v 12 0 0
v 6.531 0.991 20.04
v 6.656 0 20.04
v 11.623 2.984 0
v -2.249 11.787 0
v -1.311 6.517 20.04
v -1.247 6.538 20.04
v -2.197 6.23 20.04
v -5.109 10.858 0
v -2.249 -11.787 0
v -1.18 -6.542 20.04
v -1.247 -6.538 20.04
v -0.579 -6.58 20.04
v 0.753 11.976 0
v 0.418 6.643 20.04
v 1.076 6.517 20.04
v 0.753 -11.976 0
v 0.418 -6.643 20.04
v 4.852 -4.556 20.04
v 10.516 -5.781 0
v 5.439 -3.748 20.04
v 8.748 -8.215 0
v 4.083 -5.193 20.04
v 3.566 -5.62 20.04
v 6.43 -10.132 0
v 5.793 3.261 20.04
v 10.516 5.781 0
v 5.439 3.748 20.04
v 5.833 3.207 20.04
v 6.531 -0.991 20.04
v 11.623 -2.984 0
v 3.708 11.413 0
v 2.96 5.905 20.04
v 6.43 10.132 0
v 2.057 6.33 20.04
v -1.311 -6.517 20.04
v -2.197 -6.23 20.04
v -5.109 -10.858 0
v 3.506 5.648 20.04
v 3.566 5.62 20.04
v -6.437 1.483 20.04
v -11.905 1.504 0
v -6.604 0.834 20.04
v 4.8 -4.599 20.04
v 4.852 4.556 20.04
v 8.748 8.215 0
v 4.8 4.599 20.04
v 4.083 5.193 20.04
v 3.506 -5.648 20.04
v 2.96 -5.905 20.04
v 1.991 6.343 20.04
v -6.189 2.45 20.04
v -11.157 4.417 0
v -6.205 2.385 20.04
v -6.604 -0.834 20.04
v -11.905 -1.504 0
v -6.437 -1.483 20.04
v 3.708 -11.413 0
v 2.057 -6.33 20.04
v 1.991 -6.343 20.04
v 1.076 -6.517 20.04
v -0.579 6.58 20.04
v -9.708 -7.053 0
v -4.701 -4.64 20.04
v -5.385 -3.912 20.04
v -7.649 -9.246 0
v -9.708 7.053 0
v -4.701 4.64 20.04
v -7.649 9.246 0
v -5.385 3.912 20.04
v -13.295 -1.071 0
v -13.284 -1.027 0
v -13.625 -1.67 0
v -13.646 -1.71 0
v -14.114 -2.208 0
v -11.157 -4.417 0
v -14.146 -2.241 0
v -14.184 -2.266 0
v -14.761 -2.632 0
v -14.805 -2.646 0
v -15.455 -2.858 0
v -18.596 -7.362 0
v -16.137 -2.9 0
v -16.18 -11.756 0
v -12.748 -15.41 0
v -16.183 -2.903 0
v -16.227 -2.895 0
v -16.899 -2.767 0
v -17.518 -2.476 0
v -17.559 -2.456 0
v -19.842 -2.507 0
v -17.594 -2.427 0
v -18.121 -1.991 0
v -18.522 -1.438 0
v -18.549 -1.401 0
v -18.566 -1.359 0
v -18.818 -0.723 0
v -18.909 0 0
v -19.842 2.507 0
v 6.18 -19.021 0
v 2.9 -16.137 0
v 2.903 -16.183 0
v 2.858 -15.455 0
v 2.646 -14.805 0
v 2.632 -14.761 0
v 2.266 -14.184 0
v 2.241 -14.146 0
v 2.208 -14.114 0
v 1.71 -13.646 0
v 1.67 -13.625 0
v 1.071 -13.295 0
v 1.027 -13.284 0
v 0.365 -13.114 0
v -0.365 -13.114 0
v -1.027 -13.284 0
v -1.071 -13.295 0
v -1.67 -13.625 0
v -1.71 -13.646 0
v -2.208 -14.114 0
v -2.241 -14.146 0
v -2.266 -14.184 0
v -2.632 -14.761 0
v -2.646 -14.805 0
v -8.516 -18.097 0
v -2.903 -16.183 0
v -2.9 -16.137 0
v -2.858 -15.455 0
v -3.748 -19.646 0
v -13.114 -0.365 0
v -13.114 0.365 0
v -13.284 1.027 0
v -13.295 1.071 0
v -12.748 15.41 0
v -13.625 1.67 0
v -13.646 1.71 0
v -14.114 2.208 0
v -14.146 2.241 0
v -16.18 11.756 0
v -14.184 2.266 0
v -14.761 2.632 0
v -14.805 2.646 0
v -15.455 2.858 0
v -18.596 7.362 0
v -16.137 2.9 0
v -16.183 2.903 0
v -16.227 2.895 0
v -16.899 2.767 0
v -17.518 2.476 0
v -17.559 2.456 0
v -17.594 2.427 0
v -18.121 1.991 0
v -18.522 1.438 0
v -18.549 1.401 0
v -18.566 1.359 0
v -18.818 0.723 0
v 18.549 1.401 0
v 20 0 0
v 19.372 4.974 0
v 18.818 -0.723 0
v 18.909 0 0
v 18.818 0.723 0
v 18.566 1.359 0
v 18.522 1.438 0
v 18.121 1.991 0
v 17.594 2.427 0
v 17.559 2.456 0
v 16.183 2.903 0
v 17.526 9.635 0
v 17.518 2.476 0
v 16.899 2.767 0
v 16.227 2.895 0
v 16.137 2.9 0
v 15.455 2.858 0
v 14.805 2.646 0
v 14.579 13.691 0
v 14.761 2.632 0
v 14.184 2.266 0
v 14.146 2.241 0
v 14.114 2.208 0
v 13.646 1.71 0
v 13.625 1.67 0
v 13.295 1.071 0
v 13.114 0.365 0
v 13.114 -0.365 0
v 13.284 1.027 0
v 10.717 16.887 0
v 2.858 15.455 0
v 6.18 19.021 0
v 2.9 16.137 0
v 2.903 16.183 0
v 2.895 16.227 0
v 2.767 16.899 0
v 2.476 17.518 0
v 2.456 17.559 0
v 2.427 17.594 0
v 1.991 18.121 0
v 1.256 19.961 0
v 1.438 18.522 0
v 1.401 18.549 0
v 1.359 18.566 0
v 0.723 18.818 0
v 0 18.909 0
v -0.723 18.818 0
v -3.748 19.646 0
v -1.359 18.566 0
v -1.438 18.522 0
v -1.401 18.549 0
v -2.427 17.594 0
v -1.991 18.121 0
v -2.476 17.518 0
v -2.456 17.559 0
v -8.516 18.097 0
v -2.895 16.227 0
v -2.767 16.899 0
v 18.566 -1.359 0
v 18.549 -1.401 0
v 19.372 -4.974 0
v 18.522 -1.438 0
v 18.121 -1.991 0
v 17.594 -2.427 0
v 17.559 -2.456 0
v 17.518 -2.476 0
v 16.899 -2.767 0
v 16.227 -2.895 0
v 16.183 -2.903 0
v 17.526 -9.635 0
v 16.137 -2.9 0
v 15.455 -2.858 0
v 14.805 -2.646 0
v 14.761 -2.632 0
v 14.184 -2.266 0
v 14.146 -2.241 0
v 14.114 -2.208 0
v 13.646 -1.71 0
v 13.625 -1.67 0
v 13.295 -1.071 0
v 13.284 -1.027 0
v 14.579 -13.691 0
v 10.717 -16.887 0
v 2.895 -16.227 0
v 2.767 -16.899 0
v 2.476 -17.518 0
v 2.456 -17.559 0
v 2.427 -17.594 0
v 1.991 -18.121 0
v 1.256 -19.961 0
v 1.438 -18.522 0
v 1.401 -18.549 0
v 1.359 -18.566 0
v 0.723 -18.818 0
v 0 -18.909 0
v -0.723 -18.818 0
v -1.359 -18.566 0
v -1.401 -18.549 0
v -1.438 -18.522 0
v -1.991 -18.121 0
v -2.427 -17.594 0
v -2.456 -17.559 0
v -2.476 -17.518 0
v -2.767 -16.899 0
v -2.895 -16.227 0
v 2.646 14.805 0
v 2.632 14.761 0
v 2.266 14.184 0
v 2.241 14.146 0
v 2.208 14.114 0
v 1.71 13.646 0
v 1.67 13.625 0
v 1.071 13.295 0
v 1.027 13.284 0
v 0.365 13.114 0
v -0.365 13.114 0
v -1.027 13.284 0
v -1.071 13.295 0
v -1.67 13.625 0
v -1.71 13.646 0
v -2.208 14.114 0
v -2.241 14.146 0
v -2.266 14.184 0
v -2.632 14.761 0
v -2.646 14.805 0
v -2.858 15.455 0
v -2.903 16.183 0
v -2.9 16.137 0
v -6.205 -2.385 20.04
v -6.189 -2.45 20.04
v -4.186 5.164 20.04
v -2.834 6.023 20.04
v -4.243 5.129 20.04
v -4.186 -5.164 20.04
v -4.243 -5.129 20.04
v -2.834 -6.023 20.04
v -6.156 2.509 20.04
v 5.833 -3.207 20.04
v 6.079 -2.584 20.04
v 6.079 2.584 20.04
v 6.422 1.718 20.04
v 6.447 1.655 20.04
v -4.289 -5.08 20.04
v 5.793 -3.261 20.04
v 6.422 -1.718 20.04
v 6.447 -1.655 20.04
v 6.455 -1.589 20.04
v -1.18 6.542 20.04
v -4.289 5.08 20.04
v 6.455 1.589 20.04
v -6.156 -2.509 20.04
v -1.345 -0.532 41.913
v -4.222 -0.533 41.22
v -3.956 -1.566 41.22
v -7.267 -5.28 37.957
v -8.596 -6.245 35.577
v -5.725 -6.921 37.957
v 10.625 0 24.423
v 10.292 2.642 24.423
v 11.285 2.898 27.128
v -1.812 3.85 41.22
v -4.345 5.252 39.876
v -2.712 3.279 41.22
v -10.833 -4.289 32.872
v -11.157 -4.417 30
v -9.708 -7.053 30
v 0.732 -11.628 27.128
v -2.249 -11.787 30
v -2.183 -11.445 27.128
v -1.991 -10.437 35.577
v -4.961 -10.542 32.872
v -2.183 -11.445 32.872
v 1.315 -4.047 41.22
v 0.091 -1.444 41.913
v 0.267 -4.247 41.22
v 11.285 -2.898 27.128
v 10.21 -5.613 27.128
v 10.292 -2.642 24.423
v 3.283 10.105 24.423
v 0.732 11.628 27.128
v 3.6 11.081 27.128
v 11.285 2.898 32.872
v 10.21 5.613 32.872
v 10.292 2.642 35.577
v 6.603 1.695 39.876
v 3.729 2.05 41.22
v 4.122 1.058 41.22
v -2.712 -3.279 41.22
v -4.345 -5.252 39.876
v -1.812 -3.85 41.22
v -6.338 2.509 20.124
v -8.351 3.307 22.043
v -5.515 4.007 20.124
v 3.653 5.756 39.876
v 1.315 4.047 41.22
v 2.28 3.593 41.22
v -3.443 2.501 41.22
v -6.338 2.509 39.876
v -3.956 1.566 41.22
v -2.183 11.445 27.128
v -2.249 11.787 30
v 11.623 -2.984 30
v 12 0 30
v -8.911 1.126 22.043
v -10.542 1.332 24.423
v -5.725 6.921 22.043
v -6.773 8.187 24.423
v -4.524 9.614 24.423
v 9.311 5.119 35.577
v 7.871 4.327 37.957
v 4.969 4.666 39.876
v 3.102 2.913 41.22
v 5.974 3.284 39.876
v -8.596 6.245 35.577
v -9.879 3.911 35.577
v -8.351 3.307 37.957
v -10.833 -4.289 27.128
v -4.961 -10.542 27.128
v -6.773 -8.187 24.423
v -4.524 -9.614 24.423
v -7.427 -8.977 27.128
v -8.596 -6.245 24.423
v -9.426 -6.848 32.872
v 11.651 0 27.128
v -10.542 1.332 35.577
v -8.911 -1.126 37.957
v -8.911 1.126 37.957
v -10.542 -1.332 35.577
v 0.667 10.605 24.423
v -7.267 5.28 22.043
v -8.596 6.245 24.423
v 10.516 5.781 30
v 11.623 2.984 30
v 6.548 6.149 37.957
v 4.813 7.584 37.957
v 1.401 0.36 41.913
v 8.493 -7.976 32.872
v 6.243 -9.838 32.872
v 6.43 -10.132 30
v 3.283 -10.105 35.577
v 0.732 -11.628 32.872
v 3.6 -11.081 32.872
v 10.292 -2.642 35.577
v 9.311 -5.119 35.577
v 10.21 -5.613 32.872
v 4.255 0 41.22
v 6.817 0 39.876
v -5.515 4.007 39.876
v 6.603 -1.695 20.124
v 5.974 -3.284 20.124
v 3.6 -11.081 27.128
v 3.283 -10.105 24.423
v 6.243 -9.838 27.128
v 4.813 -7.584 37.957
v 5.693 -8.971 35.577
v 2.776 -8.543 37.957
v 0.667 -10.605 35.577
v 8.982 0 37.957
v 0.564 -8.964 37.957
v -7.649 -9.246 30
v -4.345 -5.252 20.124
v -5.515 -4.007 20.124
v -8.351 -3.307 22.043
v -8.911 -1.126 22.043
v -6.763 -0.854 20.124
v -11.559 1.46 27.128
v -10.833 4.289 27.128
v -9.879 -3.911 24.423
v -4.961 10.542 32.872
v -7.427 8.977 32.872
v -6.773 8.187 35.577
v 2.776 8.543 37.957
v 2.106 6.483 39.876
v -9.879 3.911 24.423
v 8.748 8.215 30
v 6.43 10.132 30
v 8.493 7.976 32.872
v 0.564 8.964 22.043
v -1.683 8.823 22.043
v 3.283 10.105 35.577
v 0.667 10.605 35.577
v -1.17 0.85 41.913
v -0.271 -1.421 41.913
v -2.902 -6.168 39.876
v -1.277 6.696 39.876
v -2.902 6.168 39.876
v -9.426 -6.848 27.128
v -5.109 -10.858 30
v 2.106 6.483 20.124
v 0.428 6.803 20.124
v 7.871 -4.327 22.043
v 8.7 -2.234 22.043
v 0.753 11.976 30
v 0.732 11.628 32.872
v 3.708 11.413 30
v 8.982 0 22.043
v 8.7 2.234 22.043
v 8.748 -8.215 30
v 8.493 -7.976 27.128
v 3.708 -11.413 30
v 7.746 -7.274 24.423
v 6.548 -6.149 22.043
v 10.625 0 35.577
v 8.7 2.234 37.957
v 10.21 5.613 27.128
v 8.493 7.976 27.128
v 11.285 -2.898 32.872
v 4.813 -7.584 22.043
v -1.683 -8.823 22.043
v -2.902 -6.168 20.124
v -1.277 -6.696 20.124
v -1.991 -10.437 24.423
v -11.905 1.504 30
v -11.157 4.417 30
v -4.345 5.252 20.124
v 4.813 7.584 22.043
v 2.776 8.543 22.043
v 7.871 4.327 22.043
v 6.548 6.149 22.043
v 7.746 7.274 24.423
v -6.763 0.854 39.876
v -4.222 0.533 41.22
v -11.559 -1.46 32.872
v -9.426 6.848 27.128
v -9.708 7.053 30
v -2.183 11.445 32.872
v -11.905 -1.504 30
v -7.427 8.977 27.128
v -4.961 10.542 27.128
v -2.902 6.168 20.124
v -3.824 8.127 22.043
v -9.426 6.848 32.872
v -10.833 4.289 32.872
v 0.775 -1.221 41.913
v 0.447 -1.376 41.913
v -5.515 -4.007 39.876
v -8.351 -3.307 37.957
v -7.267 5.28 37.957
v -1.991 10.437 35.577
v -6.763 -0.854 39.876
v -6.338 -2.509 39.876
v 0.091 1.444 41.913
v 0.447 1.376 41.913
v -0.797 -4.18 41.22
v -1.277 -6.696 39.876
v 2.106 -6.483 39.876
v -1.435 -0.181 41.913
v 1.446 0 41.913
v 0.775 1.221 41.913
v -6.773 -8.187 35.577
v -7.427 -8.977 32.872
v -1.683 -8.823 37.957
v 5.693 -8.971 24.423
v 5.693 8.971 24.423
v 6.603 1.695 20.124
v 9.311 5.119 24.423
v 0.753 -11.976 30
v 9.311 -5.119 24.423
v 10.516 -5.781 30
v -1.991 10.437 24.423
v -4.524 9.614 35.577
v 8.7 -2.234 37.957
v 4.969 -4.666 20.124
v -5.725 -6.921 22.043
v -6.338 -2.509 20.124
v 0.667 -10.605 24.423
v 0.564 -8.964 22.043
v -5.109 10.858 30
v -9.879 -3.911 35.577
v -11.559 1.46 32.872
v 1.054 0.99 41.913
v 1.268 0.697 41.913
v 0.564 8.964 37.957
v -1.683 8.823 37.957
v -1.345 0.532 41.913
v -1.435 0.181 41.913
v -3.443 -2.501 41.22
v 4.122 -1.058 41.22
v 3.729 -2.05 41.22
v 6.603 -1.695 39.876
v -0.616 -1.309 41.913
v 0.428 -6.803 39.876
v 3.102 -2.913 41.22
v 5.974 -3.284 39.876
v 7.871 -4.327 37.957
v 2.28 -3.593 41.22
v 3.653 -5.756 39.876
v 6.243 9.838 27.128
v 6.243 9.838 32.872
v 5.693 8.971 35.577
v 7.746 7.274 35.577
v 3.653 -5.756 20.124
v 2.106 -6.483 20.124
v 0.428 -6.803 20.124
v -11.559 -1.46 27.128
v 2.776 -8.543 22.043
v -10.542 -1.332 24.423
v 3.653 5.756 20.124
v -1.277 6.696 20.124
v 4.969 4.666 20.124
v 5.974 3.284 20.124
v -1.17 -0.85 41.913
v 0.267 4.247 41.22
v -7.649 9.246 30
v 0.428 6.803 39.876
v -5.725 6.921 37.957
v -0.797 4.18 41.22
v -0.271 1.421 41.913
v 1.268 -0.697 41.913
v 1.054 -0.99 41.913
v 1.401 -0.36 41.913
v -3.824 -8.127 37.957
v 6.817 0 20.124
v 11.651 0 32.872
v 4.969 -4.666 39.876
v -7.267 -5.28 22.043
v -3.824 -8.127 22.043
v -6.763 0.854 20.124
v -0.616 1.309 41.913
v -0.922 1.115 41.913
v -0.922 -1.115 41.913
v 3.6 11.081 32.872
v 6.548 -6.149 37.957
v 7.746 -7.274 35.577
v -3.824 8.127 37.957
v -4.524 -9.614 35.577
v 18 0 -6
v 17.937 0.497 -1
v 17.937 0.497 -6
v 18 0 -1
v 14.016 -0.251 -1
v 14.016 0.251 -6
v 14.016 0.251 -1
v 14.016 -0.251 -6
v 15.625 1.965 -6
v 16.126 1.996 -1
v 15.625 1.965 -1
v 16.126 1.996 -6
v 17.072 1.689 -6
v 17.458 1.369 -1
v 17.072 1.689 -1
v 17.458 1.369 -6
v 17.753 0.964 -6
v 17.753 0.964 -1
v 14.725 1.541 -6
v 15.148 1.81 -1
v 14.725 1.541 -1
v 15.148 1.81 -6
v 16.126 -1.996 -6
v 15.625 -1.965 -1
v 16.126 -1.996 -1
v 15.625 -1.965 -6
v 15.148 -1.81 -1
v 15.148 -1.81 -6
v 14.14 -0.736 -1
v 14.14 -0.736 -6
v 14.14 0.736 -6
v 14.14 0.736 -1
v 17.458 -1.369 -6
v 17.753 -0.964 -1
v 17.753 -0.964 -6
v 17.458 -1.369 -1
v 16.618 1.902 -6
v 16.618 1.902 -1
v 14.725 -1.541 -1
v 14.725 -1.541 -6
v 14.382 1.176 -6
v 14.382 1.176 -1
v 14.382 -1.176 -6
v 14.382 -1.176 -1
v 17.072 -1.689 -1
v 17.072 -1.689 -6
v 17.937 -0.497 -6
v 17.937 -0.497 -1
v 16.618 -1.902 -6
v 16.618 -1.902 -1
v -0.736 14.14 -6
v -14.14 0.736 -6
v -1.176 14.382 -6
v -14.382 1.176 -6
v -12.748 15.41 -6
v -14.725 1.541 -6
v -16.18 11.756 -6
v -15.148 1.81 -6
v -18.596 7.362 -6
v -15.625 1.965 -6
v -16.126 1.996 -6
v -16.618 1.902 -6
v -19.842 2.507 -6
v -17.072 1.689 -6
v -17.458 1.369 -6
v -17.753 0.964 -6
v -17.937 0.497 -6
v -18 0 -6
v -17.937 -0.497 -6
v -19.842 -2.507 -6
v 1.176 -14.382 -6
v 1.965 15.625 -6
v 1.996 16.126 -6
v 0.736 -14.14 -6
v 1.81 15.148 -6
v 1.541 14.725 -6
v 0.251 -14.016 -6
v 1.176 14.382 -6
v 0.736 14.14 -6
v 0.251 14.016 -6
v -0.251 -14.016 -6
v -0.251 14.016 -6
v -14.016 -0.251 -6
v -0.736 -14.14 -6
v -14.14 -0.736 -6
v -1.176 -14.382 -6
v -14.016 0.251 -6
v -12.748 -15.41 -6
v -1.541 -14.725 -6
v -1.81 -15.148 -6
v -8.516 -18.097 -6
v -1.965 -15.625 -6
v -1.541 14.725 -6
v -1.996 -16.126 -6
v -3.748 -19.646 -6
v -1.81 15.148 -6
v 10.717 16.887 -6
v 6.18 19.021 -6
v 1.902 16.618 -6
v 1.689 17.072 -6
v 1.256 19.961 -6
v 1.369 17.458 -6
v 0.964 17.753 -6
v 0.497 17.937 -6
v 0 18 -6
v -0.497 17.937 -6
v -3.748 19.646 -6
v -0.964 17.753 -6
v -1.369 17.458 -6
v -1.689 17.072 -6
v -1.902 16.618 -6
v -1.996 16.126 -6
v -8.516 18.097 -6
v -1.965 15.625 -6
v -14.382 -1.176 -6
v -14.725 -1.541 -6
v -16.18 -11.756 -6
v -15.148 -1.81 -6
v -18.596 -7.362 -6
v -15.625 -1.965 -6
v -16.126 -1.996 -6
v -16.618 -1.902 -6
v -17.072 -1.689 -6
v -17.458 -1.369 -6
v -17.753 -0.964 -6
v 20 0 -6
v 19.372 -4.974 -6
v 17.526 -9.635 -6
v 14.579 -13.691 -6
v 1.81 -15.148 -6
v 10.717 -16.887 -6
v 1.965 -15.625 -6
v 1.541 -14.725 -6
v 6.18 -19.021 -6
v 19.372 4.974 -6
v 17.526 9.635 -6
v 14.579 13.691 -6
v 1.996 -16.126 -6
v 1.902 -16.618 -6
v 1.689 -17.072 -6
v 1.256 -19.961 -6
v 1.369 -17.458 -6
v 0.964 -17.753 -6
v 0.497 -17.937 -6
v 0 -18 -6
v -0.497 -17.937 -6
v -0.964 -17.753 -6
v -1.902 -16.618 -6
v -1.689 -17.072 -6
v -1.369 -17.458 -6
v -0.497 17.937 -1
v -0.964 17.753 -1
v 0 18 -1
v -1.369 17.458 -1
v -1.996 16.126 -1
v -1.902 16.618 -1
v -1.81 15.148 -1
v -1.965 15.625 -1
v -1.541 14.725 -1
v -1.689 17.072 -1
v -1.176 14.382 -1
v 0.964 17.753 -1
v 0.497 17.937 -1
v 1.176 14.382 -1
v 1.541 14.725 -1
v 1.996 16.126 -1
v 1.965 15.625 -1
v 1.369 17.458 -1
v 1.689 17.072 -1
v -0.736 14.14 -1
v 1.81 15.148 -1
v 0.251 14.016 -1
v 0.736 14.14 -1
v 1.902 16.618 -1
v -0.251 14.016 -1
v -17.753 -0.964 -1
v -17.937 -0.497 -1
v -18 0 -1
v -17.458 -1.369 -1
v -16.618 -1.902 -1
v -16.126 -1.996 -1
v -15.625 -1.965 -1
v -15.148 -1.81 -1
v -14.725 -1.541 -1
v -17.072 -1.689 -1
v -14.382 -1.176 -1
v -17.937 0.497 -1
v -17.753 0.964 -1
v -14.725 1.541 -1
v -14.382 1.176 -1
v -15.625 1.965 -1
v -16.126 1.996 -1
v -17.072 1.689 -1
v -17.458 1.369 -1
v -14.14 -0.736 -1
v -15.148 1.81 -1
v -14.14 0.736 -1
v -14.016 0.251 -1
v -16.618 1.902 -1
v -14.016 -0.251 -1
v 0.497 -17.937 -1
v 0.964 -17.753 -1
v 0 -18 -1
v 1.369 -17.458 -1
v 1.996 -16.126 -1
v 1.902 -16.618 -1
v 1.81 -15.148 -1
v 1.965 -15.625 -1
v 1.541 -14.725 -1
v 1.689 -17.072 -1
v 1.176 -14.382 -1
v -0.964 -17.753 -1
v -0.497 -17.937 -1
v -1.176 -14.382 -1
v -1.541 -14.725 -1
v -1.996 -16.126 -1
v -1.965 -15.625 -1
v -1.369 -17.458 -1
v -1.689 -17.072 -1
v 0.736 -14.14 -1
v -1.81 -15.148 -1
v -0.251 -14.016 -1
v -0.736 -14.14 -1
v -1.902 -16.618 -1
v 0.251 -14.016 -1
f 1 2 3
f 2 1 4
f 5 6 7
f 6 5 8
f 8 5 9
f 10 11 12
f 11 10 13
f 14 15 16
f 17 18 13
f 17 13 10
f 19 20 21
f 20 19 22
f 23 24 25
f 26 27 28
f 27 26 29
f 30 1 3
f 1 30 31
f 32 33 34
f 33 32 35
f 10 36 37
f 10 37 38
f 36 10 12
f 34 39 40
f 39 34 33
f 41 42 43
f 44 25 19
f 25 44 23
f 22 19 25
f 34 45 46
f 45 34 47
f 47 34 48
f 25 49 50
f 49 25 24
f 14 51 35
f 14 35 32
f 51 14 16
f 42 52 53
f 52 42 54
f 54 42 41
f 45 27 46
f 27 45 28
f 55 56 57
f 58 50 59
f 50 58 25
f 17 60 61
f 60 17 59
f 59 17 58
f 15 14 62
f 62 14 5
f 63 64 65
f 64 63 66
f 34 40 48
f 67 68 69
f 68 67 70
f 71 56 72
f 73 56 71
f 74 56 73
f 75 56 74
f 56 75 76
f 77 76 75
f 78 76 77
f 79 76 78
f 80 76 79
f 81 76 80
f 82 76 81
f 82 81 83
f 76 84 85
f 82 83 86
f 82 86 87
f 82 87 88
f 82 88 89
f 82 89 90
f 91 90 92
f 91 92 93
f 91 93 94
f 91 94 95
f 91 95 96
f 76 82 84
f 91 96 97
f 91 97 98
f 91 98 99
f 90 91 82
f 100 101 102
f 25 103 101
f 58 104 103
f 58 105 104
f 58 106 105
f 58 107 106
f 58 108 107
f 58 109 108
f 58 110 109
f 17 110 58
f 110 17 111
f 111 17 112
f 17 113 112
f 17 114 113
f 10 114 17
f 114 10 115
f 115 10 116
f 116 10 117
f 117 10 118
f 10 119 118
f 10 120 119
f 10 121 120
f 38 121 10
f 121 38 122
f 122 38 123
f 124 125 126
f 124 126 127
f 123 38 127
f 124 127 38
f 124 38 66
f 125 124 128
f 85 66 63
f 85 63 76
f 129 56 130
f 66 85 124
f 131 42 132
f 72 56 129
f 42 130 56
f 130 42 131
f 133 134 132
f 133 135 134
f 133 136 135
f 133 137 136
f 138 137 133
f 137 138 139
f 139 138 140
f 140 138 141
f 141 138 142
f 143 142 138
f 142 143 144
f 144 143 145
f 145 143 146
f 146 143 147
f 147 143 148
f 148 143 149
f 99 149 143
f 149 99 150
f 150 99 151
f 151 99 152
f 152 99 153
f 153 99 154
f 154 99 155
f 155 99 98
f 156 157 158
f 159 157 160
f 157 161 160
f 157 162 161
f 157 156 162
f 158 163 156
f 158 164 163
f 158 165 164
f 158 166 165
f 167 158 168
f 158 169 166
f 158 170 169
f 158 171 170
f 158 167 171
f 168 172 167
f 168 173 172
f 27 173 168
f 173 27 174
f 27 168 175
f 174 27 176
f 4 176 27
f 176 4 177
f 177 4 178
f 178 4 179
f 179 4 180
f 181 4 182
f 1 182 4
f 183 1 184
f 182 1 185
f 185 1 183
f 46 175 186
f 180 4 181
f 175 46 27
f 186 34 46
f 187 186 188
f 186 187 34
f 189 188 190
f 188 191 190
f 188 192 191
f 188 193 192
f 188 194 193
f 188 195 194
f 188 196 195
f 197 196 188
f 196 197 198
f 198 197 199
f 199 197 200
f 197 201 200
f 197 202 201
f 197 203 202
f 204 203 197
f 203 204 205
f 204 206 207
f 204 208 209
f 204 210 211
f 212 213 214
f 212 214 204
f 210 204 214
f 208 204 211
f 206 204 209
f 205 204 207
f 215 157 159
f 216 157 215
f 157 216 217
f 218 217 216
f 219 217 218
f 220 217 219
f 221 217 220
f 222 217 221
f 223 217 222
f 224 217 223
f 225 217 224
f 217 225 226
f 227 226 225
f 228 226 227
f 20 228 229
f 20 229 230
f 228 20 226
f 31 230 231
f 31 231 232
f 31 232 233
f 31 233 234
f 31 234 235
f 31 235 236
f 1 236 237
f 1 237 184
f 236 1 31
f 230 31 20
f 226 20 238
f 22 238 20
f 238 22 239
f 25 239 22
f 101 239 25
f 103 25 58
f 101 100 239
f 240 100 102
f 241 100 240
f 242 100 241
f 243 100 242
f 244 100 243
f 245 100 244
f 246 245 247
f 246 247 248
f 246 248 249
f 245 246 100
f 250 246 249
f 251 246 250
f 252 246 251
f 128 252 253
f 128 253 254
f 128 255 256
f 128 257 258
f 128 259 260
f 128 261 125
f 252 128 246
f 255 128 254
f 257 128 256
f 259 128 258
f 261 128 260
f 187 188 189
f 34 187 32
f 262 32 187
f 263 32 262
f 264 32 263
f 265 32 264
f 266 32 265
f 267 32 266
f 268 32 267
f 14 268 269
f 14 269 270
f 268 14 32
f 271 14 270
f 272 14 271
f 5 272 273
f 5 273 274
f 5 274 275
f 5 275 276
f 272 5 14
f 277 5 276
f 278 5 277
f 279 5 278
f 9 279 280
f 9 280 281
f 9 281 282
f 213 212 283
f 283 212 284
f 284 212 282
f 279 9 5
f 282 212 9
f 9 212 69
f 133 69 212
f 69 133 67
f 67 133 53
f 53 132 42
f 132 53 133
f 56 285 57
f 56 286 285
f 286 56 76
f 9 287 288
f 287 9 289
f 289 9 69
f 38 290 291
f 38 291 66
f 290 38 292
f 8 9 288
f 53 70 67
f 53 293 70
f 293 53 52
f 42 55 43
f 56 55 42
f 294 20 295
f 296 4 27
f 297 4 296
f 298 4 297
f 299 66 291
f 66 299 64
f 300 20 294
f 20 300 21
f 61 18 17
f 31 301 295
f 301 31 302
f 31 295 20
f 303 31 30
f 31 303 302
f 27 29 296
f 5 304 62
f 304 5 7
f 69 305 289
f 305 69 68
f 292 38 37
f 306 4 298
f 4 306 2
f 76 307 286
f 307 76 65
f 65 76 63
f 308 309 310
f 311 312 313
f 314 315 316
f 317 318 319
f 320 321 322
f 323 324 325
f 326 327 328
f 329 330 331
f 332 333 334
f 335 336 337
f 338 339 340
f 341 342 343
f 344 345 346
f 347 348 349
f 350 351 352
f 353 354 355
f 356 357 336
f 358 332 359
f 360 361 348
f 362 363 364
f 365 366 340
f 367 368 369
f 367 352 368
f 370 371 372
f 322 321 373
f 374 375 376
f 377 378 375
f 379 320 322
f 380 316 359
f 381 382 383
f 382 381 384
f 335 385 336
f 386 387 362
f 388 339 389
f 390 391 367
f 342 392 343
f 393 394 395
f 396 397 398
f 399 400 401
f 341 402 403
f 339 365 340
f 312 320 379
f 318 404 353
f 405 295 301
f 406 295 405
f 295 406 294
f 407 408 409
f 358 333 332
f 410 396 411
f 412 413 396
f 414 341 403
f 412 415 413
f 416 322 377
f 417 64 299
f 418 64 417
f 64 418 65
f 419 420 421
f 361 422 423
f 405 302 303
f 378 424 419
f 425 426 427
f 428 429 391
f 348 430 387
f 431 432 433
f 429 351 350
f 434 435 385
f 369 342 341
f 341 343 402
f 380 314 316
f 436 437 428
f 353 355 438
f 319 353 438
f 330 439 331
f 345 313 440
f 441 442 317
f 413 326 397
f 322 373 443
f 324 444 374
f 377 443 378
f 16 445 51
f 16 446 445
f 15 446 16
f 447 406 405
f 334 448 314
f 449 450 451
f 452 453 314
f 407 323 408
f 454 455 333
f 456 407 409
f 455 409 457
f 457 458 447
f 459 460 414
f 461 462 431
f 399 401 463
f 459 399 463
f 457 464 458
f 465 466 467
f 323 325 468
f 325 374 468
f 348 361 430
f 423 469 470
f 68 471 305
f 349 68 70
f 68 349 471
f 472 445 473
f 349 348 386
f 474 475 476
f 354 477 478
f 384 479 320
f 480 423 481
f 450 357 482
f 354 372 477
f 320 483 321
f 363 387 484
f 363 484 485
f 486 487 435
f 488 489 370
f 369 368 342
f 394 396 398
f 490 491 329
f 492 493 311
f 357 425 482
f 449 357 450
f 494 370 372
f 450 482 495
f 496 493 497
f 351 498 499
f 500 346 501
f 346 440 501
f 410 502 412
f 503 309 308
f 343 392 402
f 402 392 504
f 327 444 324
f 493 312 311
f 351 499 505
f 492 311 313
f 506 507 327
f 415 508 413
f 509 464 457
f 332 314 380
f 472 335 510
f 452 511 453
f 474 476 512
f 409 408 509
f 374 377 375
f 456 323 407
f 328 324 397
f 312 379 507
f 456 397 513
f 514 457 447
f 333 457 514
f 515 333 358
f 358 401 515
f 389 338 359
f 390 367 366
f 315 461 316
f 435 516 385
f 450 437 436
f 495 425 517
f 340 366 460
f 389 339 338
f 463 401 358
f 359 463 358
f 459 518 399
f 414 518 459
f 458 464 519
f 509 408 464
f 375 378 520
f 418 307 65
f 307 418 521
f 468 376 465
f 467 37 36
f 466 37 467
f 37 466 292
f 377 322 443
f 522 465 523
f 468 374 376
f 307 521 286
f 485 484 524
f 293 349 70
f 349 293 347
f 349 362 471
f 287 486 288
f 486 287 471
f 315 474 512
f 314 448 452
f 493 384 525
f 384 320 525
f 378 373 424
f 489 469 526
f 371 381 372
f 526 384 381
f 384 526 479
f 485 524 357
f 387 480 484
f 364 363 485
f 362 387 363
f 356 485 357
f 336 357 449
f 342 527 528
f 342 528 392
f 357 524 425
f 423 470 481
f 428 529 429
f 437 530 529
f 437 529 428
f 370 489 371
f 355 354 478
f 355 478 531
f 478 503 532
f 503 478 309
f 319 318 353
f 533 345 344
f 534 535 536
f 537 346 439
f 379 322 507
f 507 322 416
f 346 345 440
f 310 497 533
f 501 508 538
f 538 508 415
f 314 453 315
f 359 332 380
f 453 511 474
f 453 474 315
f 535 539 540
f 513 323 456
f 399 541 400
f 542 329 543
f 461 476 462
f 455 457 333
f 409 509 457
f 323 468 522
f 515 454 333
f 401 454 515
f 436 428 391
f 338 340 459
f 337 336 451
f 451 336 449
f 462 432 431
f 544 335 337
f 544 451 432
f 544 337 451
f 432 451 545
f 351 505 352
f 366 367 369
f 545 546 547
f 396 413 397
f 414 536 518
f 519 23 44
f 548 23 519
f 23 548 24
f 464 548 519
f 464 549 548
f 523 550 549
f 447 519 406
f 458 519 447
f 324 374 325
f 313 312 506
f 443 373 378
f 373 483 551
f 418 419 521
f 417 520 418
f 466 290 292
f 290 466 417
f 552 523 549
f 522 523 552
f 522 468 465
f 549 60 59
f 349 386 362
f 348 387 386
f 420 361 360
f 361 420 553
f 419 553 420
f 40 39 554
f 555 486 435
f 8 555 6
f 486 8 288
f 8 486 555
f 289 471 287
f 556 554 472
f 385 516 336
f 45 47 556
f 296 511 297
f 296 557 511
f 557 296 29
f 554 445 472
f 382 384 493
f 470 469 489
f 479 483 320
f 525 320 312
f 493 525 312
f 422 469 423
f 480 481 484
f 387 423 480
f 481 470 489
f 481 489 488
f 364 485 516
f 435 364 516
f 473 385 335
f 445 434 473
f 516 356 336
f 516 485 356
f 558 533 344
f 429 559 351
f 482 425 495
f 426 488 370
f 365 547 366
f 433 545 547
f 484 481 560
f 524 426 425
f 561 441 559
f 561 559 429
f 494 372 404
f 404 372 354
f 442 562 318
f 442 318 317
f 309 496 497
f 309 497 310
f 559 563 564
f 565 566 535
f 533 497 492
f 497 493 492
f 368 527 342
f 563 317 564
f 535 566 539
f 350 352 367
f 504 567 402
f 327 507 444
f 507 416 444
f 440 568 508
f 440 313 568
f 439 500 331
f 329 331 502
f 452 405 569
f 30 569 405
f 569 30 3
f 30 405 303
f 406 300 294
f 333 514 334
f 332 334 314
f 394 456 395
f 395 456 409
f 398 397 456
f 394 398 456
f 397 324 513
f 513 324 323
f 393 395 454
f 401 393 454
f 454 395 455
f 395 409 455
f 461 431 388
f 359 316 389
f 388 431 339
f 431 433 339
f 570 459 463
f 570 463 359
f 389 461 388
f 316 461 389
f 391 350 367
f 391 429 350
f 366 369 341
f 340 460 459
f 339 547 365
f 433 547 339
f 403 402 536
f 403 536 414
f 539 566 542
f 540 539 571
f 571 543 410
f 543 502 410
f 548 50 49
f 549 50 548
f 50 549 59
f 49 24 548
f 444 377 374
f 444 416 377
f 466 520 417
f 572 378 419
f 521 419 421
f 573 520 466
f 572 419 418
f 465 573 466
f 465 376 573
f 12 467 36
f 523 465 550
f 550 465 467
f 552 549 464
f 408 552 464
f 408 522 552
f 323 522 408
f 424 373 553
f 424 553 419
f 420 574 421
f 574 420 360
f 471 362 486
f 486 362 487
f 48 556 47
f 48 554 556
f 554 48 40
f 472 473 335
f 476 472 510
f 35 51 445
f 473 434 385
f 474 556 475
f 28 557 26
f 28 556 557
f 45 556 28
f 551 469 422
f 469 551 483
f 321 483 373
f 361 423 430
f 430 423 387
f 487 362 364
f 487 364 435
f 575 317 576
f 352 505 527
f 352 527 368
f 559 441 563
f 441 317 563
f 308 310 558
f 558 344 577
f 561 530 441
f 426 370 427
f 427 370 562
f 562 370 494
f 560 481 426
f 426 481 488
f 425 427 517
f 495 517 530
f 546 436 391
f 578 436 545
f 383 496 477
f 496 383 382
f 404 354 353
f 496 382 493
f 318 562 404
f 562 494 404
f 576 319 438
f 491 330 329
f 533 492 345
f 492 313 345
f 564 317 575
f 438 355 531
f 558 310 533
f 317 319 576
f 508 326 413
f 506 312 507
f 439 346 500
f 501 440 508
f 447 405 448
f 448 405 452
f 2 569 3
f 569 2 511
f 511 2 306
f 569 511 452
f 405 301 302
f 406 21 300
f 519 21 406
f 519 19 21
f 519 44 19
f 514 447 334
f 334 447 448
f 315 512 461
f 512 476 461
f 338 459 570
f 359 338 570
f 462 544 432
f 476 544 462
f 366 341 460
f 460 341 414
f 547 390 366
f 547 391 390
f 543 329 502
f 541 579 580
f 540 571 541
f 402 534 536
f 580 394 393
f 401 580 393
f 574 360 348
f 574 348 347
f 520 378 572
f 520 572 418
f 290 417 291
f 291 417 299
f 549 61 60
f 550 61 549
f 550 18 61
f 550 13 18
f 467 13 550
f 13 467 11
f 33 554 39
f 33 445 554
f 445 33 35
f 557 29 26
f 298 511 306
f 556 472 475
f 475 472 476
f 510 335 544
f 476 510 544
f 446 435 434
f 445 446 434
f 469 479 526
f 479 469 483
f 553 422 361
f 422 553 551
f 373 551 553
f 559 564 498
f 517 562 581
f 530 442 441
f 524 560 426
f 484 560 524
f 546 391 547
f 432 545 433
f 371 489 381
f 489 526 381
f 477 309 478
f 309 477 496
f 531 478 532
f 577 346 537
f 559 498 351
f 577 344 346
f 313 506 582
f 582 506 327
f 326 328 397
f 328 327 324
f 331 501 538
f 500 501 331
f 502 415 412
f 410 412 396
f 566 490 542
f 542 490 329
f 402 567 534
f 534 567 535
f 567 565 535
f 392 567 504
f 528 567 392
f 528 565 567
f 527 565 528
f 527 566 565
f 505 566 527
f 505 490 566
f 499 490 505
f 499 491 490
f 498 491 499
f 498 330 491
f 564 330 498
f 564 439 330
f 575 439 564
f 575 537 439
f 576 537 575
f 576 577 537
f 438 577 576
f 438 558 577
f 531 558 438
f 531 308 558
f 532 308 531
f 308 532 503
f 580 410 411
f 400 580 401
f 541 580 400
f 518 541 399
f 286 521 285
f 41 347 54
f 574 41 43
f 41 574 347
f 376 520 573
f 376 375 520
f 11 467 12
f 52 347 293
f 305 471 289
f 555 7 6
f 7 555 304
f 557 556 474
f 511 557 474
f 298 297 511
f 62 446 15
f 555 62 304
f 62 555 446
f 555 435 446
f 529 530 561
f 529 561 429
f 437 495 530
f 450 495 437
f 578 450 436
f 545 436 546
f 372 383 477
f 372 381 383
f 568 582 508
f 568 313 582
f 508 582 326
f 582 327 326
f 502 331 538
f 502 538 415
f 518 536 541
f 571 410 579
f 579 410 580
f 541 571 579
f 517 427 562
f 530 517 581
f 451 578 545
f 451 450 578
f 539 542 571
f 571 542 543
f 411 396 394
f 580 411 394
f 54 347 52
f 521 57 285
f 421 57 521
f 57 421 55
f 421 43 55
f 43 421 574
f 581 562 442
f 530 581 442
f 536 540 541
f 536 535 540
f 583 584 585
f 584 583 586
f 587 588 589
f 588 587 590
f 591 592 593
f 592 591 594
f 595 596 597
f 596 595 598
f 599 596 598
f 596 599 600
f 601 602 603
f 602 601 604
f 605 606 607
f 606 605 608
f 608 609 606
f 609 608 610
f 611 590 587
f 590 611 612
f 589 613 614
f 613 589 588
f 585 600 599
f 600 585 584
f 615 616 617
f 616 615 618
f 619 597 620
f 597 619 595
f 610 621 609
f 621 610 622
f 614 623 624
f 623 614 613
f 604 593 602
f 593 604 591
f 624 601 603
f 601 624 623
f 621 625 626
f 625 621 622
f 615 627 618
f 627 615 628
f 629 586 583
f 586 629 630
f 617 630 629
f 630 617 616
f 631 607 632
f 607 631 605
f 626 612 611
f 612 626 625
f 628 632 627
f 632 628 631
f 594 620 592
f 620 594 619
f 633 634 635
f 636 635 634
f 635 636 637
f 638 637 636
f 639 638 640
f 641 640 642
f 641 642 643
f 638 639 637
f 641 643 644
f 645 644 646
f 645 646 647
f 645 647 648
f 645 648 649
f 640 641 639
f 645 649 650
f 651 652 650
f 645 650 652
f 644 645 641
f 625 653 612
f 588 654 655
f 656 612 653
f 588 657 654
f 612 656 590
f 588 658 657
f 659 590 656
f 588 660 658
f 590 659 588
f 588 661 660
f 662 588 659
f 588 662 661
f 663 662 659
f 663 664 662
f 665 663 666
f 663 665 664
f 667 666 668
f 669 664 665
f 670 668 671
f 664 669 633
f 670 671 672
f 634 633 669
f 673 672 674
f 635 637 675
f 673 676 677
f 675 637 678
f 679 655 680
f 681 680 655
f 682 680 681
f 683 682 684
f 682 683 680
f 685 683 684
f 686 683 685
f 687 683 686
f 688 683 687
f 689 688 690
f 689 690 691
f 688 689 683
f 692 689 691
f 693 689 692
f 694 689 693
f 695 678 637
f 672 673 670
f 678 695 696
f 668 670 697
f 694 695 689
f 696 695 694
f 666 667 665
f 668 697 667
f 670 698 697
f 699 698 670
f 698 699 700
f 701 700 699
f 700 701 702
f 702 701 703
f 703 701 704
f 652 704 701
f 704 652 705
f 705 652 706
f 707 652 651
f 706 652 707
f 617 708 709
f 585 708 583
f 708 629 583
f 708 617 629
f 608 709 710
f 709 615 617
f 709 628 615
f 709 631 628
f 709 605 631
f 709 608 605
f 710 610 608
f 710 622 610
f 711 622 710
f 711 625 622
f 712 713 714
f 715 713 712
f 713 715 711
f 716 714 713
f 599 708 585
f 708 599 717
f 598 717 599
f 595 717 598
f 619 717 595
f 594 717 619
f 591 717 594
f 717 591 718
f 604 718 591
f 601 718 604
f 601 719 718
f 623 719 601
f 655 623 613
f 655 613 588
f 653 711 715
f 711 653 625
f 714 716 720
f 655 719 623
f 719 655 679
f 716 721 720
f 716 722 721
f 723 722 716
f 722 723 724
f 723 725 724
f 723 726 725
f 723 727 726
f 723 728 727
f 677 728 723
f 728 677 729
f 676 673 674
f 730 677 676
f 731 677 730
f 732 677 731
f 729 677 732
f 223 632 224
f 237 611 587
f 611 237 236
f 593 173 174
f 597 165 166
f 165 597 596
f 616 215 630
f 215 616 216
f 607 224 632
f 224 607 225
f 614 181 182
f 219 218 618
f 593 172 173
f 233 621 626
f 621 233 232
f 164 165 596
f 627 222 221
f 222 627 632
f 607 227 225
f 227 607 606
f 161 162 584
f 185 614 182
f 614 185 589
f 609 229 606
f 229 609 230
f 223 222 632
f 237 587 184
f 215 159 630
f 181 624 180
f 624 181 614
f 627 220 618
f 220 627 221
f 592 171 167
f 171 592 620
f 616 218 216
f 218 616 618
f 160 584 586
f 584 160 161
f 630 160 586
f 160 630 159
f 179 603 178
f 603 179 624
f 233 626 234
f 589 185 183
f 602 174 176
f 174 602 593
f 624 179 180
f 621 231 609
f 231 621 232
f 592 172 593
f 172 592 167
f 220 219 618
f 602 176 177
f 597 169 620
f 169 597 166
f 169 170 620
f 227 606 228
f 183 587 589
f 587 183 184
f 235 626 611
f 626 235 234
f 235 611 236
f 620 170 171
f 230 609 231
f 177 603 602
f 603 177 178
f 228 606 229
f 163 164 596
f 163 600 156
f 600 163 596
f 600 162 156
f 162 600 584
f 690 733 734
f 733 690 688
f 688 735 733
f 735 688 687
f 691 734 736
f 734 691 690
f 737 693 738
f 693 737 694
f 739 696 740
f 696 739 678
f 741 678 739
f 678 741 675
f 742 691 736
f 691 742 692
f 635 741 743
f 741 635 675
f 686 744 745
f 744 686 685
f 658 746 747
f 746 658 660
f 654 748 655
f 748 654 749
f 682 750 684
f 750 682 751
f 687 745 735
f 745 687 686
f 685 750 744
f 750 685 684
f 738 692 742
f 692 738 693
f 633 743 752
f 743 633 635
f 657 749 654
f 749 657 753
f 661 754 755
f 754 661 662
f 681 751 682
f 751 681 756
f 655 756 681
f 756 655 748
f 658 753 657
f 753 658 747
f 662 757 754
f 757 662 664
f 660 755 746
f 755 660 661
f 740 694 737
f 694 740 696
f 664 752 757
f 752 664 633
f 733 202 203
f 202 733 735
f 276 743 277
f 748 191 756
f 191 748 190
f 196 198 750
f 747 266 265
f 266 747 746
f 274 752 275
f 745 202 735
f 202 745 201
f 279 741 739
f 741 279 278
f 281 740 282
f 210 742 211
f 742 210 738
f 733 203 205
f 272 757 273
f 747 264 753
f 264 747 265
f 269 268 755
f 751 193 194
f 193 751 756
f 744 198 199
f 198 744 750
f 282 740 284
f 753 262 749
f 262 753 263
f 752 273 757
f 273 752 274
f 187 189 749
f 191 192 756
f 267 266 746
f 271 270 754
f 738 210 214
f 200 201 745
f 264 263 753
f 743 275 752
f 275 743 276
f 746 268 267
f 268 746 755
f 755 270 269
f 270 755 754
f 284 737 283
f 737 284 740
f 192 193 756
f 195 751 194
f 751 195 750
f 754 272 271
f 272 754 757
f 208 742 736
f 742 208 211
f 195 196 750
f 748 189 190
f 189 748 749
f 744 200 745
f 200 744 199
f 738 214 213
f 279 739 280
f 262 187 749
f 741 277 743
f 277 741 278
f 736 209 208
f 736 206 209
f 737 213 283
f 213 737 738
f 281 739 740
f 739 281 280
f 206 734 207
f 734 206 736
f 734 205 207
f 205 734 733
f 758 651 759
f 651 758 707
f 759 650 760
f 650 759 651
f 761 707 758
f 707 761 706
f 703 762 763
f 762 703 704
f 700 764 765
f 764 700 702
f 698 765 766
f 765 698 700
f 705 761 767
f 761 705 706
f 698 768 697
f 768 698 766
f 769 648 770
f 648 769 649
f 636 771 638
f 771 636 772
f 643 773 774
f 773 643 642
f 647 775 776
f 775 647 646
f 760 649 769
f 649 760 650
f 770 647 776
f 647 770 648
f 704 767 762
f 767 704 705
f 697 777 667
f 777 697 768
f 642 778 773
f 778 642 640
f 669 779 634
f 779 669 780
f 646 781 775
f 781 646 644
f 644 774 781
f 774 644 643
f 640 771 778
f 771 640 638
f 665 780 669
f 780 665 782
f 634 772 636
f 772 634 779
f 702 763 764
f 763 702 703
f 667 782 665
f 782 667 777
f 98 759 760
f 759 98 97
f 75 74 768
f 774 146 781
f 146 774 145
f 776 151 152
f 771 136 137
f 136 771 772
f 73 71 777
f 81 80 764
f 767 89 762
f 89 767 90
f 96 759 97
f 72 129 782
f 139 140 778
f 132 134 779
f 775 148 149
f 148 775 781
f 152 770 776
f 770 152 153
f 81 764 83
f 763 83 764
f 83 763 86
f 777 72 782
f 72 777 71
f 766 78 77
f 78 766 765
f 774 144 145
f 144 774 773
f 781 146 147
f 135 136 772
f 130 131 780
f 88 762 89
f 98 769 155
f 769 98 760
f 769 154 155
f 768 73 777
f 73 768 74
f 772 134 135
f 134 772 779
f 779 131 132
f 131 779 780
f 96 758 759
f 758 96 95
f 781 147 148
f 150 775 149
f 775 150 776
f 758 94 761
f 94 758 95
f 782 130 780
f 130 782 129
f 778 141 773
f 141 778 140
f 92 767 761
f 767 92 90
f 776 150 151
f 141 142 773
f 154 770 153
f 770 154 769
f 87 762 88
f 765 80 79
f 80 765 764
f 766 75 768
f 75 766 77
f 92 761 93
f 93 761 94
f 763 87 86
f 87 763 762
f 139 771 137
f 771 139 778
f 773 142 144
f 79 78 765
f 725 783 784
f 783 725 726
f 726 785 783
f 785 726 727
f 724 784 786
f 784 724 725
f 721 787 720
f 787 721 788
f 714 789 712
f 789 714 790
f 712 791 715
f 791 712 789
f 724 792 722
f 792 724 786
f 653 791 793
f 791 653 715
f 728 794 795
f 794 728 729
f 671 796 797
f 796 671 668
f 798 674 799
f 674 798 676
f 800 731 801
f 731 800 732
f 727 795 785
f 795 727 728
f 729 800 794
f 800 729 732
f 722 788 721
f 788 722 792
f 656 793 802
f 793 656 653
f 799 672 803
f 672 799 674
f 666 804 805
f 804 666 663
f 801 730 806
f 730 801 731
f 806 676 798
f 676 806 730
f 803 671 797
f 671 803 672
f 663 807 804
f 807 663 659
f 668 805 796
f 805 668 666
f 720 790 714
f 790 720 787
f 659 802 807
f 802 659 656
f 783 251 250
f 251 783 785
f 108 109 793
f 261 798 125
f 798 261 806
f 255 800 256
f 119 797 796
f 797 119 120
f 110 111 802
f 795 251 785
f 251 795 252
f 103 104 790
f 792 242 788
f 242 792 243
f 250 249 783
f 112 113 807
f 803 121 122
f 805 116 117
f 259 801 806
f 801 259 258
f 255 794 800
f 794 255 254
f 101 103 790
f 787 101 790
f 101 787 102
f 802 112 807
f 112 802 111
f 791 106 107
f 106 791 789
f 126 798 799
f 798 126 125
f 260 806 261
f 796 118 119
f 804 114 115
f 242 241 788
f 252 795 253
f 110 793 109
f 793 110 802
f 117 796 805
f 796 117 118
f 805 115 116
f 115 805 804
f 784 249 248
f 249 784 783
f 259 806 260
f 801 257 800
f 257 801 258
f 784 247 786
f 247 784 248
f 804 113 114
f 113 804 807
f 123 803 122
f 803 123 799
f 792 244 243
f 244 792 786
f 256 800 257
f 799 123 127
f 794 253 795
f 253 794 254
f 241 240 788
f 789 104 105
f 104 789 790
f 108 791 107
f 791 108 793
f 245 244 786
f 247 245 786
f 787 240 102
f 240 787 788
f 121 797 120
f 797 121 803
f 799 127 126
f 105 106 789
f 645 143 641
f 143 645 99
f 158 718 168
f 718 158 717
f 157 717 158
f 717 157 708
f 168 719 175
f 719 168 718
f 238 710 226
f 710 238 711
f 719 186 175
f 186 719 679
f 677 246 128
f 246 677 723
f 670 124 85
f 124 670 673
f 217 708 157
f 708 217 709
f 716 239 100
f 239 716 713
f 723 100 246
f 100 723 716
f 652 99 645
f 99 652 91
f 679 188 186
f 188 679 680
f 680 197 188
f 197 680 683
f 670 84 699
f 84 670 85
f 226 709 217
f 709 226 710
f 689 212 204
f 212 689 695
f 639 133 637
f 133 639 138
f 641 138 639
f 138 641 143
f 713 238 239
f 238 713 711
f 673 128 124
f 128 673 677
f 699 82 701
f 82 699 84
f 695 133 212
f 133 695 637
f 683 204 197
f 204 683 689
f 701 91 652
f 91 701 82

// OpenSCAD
// Nominal diameter of the ball
ballDiameter = 24;
// Girth of the shaft at the knob
shaftDiameter = 8;
// Length of the shaft
shaftLength = 30;
// Diameter of the flange
flangeDiameter = 40;
// Thickness of the flange
flangeThickness = 6;
// Flange Hole diameter
flangeHoleDiameter = 4;
// Flange Countersink Diameter
flangeCountersinkDiameter = 6;
// Flange Countersink Depth
flangeCountersinkDepth = 1;

shaftBaseDiameter = flangeDiameter - (flangeCountersinkDiameter * 2) - (flangeDiameter / 10);

// Preview mode (faster, visualizes cuts but does not perform them)
previewDingus = true;

// Z-level of the end of the dingus
tip = shaftLength+ballDiameter/2;

cutColor = "white";

$fn = 25;

function chordLength(r, t) = 2 * sqrt(abs(r)^2 - abs(t)^2);
// Calculate chord given diameter and offset from center, returns 1/2 chord length
function radialChord(d, t) = sqrt(abs(d/2)^2 - abs(t)^2);

module dingus() {
    union() {
        // Construct the basic dingus
        // Shaft
        color("skyblue", 1)
        cylinder(h = shaftLength, d1=shaftBaseDiameter, d2 = shaftDiameter);
        // Ball
        color("skyblue", 1)
        translate([0, 0, shaftLength])
            sphere(d=ballDiameter);  
    }
};

module flange() {
    difference() {
        translate([0, 0, -flangeThickness])
        cylinder(flangeThickness, d = flangeDiameter);
        union() {
        for(r = [0 : 360/4 : 360]) {
            rotate([0, 0, r]) {
                translate([flangeDiameter/2 - flangeHoleDiameter, 0, -flangeThickness]) {
                    cylinder(h = 10, d=flangeHoleDiameter);
                }
                translate([flangeDiameter/2 - flangeHoleDiameter, 0, -flangeCountersinkDepth]) {
                    cylinder(h = flangeCountersinkDepth+0.1, d1=flangeHoleDiameter, d2=flangeCountersinkDiameter);
                }
            }
        }
    }
}
}


if(previewDingus) {
        dingus();
        flange();
}
else {
    dingus(); 
}
